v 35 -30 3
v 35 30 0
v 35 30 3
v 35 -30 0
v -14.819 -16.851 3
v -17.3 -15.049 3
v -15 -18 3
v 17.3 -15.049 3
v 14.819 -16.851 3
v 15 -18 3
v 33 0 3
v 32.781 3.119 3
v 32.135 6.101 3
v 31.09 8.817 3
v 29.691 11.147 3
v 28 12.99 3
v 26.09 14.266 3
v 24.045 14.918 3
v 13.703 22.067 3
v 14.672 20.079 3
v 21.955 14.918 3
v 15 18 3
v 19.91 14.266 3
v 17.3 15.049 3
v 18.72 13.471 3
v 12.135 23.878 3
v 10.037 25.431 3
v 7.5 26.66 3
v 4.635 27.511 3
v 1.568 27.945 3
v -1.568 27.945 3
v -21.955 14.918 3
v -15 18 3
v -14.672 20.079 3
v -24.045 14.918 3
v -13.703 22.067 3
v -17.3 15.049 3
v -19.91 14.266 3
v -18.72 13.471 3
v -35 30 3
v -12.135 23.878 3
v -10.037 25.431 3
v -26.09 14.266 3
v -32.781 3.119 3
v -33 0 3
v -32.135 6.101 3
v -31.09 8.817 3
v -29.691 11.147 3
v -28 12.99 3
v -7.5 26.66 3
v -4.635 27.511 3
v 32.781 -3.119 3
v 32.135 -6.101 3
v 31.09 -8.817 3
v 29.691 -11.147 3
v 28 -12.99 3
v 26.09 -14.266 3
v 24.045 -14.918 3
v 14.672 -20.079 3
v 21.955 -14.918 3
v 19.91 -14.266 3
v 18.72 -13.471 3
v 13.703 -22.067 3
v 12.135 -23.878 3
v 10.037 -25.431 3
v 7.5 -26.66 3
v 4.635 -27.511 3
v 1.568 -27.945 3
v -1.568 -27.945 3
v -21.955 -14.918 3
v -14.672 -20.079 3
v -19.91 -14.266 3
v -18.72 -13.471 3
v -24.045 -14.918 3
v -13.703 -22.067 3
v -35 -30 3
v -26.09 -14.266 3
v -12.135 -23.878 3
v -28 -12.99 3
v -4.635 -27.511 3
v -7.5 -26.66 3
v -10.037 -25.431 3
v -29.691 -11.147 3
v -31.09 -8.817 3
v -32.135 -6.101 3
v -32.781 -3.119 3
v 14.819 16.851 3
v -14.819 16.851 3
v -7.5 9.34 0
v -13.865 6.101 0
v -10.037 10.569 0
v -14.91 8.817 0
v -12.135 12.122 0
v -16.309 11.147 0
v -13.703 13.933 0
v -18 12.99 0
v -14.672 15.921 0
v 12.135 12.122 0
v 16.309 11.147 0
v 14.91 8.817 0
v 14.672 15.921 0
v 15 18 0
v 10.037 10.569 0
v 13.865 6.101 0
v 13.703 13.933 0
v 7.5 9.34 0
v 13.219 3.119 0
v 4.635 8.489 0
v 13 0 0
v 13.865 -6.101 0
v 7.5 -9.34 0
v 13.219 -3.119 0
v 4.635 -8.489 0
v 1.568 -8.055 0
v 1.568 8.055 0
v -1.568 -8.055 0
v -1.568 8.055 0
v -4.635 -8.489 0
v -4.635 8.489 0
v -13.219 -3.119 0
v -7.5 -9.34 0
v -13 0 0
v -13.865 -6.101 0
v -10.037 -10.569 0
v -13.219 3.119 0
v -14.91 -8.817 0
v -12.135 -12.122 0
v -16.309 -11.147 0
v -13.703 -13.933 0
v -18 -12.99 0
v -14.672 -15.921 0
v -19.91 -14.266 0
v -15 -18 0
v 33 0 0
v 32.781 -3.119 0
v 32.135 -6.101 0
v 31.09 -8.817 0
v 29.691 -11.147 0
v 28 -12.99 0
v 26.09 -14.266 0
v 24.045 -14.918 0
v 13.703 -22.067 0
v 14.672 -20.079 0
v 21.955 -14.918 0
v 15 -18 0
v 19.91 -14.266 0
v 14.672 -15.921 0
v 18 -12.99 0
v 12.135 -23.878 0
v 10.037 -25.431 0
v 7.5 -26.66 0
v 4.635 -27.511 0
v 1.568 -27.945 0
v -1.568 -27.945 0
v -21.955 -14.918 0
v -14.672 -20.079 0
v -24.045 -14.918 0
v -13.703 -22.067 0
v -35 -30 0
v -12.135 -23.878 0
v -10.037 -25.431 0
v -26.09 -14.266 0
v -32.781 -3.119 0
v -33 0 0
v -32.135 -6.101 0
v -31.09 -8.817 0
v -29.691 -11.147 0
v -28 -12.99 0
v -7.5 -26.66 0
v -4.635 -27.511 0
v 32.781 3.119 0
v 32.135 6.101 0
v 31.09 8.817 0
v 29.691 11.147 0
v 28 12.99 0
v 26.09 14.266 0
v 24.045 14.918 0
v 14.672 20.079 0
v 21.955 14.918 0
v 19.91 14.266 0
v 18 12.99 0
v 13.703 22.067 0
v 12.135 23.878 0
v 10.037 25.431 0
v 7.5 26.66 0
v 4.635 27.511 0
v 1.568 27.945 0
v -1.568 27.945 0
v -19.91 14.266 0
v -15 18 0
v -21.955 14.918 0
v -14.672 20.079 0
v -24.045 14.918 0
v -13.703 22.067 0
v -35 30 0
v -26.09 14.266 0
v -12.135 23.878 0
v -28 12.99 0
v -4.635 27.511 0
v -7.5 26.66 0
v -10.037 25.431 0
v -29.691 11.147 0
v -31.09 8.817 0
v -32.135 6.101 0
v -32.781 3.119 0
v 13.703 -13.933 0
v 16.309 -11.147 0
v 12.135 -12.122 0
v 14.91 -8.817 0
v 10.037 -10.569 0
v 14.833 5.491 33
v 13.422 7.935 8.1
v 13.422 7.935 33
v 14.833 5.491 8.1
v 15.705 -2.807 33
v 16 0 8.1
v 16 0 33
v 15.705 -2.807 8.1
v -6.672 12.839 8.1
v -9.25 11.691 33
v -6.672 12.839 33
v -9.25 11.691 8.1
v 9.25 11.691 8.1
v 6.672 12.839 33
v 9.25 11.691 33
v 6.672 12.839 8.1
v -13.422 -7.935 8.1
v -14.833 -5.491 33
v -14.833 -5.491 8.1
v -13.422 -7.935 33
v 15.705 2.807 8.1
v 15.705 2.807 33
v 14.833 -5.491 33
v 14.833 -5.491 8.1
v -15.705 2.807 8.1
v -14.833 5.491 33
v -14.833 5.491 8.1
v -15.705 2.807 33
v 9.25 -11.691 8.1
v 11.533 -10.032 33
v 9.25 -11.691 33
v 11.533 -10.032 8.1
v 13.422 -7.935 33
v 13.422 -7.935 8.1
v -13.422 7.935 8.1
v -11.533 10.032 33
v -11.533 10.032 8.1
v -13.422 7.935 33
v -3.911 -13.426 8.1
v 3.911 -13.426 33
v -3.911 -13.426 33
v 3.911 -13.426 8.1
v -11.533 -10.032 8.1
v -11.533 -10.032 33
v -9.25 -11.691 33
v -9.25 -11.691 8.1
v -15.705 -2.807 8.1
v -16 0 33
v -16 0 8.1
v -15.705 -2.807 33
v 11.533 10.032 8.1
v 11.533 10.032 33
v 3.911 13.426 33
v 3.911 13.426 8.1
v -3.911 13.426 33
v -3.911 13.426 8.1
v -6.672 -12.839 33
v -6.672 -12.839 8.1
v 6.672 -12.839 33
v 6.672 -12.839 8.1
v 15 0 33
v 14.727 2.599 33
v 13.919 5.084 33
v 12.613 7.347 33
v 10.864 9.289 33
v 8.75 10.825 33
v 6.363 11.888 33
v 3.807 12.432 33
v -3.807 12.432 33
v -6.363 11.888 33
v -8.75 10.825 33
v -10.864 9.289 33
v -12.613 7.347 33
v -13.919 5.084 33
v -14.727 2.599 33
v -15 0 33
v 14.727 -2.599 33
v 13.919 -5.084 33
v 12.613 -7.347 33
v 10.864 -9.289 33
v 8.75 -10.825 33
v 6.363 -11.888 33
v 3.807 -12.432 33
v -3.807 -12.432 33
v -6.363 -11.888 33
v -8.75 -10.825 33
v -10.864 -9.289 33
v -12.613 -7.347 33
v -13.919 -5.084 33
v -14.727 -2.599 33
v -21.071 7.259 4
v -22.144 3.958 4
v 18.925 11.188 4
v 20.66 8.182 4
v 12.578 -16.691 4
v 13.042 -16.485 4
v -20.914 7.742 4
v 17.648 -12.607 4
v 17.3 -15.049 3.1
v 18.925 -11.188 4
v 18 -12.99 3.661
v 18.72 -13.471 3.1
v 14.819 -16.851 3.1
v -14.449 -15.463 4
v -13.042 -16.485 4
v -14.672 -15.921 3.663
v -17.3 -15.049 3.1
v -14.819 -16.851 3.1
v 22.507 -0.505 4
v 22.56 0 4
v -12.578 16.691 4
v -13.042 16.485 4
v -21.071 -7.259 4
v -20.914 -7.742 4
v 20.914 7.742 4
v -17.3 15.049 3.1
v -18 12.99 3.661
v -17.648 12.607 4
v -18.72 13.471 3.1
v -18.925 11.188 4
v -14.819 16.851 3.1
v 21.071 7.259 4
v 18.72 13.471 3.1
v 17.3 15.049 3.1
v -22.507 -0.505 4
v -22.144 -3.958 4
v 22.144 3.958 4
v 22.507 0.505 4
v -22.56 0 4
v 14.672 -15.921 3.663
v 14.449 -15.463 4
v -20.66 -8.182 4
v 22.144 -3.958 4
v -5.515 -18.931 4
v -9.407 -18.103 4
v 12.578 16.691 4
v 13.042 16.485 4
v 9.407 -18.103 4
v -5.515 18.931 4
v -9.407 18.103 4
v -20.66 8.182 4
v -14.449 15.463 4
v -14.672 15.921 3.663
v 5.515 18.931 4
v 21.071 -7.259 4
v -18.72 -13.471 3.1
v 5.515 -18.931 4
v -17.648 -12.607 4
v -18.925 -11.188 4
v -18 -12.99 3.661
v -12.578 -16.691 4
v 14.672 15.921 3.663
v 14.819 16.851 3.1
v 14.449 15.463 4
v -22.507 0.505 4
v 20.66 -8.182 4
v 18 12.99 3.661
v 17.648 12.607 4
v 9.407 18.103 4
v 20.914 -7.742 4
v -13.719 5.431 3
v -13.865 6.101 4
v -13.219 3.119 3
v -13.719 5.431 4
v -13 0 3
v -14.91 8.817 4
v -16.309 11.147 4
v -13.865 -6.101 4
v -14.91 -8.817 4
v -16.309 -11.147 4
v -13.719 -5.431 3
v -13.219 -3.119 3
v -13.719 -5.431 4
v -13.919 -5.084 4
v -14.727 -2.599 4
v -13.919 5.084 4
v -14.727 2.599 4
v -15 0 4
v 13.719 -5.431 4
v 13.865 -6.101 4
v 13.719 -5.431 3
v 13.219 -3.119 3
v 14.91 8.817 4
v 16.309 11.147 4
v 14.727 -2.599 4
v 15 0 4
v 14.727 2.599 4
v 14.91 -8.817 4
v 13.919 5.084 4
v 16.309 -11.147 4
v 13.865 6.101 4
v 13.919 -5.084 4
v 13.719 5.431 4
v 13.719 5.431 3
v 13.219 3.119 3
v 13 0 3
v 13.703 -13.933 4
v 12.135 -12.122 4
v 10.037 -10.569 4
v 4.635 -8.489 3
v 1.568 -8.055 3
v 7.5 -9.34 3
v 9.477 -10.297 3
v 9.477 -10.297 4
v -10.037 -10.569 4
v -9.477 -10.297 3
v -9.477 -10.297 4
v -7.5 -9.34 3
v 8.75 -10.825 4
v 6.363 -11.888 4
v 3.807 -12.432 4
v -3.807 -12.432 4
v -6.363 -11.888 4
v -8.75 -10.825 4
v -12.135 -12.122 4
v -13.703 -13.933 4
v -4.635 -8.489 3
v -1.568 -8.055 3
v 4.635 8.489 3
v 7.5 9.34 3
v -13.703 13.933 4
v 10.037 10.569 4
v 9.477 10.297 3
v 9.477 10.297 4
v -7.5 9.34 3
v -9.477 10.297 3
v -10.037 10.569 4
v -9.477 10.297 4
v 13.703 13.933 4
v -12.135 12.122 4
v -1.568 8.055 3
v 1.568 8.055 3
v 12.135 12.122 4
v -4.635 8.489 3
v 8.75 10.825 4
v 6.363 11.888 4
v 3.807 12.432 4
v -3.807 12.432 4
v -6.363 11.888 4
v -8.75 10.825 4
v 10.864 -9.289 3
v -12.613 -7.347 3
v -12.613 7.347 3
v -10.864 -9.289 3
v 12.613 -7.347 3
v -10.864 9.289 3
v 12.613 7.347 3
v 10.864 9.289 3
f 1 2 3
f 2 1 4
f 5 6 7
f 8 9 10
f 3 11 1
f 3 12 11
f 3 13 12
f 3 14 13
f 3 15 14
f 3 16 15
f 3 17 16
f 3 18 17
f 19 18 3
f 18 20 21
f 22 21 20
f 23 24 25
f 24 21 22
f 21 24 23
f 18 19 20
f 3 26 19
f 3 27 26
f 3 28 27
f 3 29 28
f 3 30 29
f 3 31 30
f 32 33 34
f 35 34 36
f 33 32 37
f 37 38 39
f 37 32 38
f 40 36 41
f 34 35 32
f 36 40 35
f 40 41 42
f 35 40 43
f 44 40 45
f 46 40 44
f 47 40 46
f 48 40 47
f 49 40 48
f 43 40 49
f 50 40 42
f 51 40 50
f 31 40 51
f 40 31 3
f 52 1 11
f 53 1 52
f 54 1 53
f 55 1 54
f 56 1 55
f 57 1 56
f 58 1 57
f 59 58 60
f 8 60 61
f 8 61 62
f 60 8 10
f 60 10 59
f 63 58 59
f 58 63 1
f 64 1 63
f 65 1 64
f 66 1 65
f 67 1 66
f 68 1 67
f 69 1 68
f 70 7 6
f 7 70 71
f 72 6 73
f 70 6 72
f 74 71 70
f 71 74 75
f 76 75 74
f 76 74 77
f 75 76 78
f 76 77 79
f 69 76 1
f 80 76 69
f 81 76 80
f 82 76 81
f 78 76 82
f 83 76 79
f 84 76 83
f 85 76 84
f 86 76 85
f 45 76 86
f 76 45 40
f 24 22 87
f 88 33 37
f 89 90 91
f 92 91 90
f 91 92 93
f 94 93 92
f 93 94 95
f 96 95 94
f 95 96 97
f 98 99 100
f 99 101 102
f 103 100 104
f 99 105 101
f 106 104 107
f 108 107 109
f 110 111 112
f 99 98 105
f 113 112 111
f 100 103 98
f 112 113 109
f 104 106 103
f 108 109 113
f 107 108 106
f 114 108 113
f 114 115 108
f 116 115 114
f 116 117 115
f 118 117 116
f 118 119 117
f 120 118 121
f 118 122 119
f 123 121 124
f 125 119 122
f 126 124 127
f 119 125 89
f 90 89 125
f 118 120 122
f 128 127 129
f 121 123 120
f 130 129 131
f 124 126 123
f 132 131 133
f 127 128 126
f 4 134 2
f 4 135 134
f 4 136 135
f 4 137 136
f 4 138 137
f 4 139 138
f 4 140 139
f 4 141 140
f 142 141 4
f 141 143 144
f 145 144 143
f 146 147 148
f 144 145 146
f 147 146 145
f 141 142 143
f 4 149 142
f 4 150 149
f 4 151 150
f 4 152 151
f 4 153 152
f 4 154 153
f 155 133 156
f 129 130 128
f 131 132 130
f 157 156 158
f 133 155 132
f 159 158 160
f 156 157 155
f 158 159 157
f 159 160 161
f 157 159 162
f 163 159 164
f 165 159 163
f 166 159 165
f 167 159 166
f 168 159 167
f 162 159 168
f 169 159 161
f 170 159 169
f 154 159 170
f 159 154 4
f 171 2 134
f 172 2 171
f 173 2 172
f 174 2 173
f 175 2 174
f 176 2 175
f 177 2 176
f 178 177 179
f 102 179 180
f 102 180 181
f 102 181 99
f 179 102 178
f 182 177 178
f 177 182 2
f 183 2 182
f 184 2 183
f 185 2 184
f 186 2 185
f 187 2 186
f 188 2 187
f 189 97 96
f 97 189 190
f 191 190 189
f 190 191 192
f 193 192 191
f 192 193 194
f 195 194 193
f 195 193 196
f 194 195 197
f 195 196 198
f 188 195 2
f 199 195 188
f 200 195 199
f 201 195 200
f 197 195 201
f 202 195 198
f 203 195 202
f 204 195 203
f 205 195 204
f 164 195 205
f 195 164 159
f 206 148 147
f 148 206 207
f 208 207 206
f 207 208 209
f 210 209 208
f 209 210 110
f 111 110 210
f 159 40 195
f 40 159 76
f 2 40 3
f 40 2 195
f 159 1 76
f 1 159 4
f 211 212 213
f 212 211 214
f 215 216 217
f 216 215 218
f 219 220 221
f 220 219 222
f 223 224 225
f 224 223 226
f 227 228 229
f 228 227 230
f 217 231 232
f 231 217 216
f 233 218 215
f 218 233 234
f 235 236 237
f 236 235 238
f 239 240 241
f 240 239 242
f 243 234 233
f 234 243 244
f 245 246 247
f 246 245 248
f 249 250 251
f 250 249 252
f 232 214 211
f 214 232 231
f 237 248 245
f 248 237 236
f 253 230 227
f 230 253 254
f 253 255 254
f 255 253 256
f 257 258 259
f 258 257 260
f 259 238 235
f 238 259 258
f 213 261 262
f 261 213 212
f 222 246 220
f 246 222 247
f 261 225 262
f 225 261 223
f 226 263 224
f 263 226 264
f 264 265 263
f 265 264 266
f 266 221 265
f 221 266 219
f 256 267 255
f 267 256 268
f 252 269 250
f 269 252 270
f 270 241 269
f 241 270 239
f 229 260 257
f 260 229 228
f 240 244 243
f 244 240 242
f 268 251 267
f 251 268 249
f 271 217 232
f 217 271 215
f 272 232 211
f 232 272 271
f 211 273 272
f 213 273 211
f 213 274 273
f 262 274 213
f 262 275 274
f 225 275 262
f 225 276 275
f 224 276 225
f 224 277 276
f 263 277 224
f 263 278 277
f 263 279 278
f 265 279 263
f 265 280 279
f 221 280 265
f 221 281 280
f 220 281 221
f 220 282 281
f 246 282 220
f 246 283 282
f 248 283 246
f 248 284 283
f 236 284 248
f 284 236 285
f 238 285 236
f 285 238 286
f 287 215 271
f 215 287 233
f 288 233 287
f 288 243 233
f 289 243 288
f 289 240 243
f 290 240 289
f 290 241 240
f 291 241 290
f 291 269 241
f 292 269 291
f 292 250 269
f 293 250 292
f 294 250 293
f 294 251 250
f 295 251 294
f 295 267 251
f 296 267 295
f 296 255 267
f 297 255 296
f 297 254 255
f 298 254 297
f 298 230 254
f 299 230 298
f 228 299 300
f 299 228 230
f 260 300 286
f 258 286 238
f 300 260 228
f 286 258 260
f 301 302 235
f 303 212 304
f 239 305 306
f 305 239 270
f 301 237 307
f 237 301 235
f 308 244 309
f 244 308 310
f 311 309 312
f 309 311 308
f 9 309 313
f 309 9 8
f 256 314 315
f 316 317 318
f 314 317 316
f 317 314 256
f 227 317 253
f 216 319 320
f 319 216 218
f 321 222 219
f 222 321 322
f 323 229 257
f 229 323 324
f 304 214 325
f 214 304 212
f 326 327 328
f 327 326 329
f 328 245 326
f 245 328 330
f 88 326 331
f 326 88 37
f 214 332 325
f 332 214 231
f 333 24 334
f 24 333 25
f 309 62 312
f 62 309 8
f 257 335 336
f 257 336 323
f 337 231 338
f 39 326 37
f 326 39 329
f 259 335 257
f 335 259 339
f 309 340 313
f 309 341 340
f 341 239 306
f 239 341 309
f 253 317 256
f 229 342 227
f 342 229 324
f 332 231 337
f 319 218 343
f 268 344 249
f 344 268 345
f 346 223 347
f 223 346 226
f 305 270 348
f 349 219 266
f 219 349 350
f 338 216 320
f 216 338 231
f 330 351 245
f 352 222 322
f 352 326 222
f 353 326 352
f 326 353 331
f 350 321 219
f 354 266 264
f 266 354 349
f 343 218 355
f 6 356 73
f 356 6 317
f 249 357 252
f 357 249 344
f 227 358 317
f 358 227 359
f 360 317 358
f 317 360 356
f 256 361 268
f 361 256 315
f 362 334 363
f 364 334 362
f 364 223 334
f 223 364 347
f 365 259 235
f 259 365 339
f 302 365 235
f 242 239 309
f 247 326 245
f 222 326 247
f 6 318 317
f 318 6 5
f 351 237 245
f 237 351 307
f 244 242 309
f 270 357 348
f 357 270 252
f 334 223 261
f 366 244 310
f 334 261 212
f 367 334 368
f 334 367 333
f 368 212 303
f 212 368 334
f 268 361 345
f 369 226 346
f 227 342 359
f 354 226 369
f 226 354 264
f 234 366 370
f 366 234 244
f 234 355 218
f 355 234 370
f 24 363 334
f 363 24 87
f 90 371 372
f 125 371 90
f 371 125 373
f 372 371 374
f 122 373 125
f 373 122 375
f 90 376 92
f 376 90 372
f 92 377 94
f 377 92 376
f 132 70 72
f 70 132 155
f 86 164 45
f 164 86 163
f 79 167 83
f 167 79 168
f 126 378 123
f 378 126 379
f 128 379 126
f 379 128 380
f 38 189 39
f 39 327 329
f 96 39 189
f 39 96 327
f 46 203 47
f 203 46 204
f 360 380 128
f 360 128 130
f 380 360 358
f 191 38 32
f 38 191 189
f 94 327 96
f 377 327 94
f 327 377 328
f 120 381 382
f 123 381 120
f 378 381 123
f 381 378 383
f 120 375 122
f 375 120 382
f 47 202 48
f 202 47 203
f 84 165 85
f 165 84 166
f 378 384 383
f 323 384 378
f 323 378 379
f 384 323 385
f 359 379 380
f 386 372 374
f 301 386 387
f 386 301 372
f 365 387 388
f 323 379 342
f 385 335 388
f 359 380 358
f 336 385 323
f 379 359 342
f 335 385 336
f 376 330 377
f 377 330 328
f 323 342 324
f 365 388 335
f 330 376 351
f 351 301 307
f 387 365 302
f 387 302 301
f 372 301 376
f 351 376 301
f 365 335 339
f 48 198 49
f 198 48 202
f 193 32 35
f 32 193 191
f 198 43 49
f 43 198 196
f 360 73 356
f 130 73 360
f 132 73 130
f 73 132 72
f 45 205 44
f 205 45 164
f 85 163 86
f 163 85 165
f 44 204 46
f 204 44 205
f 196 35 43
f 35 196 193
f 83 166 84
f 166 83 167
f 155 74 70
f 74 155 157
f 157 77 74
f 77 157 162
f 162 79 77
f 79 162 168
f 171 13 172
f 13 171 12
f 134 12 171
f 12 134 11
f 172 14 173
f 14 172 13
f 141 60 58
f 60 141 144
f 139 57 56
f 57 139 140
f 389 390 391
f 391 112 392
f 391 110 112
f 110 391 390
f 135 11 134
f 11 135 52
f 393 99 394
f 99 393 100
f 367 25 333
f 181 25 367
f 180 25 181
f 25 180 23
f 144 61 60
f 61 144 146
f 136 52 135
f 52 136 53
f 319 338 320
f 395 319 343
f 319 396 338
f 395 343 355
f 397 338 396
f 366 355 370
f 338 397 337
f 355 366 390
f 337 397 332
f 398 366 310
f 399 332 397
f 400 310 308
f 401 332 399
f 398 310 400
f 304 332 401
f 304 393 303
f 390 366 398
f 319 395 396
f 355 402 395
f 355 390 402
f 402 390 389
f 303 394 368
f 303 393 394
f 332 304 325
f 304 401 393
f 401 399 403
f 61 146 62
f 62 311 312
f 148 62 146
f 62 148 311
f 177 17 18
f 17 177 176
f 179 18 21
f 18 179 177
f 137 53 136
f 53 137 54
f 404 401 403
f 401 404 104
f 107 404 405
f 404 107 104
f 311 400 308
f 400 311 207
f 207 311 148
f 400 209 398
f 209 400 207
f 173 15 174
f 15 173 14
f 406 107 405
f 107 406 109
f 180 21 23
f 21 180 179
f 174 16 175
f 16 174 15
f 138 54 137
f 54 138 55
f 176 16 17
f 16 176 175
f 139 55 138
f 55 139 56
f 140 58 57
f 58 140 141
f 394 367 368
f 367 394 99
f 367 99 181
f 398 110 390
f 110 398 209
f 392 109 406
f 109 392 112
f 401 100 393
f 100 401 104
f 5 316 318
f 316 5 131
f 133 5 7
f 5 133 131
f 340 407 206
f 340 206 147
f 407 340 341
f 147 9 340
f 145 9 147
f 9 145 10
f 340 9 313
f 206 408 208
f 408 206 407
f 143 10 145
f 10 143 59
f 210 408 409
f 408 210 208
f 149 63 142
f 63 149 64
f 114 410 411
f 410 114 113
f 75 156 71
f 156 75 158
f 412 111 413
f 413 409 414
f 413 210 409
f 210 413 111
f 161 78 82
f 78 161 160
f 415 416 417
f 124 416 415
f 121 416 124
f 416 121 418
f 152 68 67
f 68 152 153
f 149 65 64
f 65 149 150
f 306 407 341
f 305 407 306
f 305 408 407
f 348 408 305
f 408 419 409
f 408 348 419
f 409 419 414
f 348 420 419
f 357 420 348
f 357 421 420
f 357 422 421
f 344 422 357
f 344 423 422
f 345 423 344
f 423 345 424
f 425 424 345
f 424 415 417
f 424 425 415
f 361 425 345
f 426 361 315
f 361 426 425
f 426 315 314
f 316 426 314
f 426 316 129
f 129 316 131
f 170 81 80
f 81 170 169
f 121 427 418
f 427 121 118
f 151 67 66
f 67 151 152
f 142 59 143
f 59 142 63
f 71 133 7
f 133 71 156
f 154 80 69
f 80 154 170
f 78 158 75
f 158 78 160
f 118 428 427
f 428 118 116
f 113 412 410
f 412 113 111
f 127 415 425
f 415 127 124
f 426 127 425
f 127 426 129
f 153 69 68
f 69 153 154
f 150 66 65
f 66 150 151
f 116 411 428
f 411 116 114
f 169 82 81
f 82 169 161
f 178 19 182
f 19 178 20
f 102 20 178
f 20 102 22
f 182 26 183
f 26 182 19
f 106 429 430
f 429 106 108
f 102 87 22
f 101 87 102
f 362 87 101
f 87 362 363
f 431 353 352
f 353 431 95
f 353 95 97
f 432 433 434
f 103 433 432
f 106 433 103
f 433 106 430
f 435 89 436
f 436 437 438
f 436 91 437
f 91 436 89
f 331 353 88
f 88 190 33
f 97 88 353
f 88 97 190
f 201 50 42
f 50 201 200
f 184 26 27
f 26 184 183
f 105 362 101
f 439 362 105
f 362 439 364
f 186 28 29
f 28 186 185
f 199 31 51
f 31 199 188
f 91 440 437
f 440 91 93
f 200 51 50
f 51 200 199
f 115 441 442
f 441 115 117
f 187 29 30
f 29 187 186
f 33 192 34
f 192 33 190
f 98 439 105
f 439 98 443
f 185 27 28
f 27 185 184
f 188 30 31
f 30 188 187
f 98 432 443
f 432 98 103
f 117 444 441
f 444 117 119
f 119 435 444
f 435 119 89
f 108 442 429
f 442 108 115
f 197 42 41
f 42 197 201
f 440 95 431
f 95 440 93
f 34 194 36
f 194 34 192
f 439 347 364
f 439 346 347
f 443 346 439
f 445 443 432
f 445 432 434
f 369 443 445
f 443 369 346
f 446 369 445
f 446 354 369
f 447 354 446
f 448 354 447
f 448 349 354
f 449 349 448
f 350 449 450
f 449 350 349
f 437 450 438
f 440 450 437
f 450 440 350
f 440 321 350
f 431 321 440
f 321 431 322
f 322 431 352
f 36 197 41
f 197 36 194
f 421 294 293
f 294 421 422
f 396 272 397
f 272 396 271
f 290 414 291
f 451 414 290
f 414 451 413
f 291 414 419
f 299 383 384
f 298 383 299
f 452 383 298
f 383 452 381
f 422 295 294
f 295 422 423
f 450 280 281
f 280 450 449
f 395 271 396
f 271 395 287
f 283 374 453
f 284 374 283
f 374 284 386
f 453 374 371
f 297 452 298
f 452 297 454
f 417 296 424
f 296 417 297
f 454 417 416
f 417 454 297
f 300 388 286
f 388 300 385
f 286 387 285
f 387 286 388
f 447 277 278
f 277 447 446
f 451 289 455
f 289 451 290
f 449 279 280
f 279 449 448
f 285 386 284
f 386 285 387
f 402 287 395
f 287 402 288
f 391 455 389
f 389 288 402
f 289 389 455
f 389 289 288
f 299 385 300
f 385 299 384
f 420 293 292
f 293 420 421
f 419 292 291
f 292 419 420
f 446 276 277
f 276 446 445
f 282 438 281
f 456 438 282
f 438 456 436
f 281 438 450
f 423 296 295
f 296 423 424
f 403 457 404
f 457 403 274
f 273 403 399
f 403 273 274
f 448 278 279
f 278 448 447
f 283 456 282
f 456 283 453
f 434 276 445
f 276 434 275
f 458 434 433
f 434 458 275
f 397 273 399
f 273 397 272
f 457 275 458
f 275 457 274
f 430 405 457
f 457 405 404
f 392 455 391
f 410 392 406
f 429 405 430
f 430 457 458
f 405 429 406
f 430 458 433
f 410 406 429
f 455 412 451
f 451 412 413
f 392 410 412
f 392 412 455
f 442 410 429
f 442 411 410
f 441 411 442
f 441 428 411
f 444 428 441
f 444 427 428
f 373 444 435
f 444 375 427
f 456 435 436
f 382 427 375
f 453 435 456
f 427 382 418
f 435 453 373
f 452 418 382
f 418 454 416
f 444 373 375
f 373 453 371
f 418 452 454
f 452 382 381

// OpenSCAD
// Fan Stand for Hand Fan
// Base plate: 70mm x 60mm
// Oval cylinder: 30mm x 25mm (positioned in center)

// Parameters
base_length = 70;  // mm
base_width = 60;   // mm
base_thickness = 3; // mm

cylinder_length = 32; // mm (along base length) - increased from 30 to accommodate handle + wall
cylinder_width = 27;  // mm (along base width) - increased from 25 to accommodate handle + wall
cylinder_height = 30; // mm

// Handle cavity parameters
handle_length = 30;   // mm - actual handle size
handle_width = 25;    // mm - actual handle size
wall_thickness = 1;   // mm - wall thickness around handle (should be 2mm total = 1mm each side)

// Taper parameters
taper_height = 5;     // mm - height of the tapered support
taper_scale = 1.5;    // scale factor for taper base (1.5 = 50% larger)

// Cutout parameters
cutout_width = 20;    // mm - width of the oval cutouts (increased from 16)
cutout_length = 30;   // mm - length of the oval cutouts (increased from 24)
cutout_offset = 12;   // mm - distance from edge to center of cutout (moved further out)

// Create the fan stand
fan_stand();

module fan_stand() {
    difference() {
        union() {
            // Base plate
            base_plate();
            
            // Oval cylinder in the center
            translate([0, 0, base_thickness]) {
                oval_cylinder();
            }
            
            // Tapered support at base of cylinder
            translate([0, 0, base_thickness]) {
                tapered_support();
            }
        }
        
        // Cut out half-moon shapes from all four sides
        cutouts();
        
        // Cut out handle cavity inside cylinder
        translate([0, 0, base_thickness]) {
            handle_cavity();
        }
    }
}

module base_plate() {
    translate([-base_length/2, -base_width/2, 0]) {
        cube([base_length, base_width, base_thickness]);
    }
}

module oval_cylinder() {
    // Create oval cylinder using hull of two cylinders
    hull() {
        // Cylinder at one end
        translate([-(cylinder_length-cylinder_width)/2, 0, 0]) {
            cylinder(h=cylinder_height, d=cylinder_width, center=false);
        }
        
        // Cylinder at other end
        translate([(cylinder_length-cylinder_width)/2, 0, 0]) {
            cylinder(h=cylinder_height, d=cylinder_width, center=false);
        }
    }
}

module tapered_support() {
    // Create tapered support using hull between oval shapes
    hull() {
        // Bottom larger oval (at base plate level)
        translate([0, 0, 0]) {
            scale([taper_scale, taper_scale, 1]) {
                oval_base();
            }
        }
        
        // Top smaller oval (at cylinder base)
        translate([0, 0, taper_height]) {
            oval_base();
        }
    }
}

module oval_base() {
    // Create oval base shape using hull of two cylinders
    hull() {
        // Cylinder at one end
        translate([-(cylinder_length-cylinder_width)/2, 0, 0]) {
            cylinder(h=0.1, d=cylinder_width, center=false);
        }
        
        // Cylinder at other end
        translate([(cylinder_length-cylinder_width)/2, 0, 0]) {
            cylinder(h=0.1, d=cylinder_width, center=false);
        }
    }
}

module cutouts() {
    // Cut out oval shapes from all four sides
    // Long sides (left and right) - vertical ovals
    translate([-base_length/2 + cutout_offset, 0, -1]) {
        scale([1, cutout_length/cutout_width, 1]) {
            cylinder(h=base_thickness + 2, d=cutout_width, center=false);
        }
    }
    translate([base_length/2 - cutout_offset, 0, -1]) {
        scale([1, cutout_length/cutout_width, 1]) {
            cylinder(h=base_thickness + 2, d=cutout_width, center=false);
        }
    }
    
    // Short sides (front and back) - horizontal ovals
    translate([0, -base_width/2 + cutout_offset, -1]) {
        scale([cutout_length/cutout_width, 1, 1]) {
            cylinder(h=base_thickness + 2, d=cutout_width, center=false);
        }
    }
    translate([0, base_width/2 - cutout_offset, -1]) {
        scale([cutout_length/cutout_width, 1, 1]) {
            cylinder(h=base_thickness + 2, d=cutout_width, center=false);
        }
    }
}

module handle_cavity() {
    // Create oval cavity for handle inside cylinder
    hull() {
        // Cylinder at one end
        translate([-(handle_length-handle_width)/2, 0, 0]) {
            cylinder(h=cylinder_height + 1, d=handle_width, center=false);
        }
        
        // Cylinder at other end
        translate([(handle_length-handle_width)/2, 0, 0]) {
            cylinder(h=cylinder_height + 1, d=handle_width, center=false);
        }
    }
}
